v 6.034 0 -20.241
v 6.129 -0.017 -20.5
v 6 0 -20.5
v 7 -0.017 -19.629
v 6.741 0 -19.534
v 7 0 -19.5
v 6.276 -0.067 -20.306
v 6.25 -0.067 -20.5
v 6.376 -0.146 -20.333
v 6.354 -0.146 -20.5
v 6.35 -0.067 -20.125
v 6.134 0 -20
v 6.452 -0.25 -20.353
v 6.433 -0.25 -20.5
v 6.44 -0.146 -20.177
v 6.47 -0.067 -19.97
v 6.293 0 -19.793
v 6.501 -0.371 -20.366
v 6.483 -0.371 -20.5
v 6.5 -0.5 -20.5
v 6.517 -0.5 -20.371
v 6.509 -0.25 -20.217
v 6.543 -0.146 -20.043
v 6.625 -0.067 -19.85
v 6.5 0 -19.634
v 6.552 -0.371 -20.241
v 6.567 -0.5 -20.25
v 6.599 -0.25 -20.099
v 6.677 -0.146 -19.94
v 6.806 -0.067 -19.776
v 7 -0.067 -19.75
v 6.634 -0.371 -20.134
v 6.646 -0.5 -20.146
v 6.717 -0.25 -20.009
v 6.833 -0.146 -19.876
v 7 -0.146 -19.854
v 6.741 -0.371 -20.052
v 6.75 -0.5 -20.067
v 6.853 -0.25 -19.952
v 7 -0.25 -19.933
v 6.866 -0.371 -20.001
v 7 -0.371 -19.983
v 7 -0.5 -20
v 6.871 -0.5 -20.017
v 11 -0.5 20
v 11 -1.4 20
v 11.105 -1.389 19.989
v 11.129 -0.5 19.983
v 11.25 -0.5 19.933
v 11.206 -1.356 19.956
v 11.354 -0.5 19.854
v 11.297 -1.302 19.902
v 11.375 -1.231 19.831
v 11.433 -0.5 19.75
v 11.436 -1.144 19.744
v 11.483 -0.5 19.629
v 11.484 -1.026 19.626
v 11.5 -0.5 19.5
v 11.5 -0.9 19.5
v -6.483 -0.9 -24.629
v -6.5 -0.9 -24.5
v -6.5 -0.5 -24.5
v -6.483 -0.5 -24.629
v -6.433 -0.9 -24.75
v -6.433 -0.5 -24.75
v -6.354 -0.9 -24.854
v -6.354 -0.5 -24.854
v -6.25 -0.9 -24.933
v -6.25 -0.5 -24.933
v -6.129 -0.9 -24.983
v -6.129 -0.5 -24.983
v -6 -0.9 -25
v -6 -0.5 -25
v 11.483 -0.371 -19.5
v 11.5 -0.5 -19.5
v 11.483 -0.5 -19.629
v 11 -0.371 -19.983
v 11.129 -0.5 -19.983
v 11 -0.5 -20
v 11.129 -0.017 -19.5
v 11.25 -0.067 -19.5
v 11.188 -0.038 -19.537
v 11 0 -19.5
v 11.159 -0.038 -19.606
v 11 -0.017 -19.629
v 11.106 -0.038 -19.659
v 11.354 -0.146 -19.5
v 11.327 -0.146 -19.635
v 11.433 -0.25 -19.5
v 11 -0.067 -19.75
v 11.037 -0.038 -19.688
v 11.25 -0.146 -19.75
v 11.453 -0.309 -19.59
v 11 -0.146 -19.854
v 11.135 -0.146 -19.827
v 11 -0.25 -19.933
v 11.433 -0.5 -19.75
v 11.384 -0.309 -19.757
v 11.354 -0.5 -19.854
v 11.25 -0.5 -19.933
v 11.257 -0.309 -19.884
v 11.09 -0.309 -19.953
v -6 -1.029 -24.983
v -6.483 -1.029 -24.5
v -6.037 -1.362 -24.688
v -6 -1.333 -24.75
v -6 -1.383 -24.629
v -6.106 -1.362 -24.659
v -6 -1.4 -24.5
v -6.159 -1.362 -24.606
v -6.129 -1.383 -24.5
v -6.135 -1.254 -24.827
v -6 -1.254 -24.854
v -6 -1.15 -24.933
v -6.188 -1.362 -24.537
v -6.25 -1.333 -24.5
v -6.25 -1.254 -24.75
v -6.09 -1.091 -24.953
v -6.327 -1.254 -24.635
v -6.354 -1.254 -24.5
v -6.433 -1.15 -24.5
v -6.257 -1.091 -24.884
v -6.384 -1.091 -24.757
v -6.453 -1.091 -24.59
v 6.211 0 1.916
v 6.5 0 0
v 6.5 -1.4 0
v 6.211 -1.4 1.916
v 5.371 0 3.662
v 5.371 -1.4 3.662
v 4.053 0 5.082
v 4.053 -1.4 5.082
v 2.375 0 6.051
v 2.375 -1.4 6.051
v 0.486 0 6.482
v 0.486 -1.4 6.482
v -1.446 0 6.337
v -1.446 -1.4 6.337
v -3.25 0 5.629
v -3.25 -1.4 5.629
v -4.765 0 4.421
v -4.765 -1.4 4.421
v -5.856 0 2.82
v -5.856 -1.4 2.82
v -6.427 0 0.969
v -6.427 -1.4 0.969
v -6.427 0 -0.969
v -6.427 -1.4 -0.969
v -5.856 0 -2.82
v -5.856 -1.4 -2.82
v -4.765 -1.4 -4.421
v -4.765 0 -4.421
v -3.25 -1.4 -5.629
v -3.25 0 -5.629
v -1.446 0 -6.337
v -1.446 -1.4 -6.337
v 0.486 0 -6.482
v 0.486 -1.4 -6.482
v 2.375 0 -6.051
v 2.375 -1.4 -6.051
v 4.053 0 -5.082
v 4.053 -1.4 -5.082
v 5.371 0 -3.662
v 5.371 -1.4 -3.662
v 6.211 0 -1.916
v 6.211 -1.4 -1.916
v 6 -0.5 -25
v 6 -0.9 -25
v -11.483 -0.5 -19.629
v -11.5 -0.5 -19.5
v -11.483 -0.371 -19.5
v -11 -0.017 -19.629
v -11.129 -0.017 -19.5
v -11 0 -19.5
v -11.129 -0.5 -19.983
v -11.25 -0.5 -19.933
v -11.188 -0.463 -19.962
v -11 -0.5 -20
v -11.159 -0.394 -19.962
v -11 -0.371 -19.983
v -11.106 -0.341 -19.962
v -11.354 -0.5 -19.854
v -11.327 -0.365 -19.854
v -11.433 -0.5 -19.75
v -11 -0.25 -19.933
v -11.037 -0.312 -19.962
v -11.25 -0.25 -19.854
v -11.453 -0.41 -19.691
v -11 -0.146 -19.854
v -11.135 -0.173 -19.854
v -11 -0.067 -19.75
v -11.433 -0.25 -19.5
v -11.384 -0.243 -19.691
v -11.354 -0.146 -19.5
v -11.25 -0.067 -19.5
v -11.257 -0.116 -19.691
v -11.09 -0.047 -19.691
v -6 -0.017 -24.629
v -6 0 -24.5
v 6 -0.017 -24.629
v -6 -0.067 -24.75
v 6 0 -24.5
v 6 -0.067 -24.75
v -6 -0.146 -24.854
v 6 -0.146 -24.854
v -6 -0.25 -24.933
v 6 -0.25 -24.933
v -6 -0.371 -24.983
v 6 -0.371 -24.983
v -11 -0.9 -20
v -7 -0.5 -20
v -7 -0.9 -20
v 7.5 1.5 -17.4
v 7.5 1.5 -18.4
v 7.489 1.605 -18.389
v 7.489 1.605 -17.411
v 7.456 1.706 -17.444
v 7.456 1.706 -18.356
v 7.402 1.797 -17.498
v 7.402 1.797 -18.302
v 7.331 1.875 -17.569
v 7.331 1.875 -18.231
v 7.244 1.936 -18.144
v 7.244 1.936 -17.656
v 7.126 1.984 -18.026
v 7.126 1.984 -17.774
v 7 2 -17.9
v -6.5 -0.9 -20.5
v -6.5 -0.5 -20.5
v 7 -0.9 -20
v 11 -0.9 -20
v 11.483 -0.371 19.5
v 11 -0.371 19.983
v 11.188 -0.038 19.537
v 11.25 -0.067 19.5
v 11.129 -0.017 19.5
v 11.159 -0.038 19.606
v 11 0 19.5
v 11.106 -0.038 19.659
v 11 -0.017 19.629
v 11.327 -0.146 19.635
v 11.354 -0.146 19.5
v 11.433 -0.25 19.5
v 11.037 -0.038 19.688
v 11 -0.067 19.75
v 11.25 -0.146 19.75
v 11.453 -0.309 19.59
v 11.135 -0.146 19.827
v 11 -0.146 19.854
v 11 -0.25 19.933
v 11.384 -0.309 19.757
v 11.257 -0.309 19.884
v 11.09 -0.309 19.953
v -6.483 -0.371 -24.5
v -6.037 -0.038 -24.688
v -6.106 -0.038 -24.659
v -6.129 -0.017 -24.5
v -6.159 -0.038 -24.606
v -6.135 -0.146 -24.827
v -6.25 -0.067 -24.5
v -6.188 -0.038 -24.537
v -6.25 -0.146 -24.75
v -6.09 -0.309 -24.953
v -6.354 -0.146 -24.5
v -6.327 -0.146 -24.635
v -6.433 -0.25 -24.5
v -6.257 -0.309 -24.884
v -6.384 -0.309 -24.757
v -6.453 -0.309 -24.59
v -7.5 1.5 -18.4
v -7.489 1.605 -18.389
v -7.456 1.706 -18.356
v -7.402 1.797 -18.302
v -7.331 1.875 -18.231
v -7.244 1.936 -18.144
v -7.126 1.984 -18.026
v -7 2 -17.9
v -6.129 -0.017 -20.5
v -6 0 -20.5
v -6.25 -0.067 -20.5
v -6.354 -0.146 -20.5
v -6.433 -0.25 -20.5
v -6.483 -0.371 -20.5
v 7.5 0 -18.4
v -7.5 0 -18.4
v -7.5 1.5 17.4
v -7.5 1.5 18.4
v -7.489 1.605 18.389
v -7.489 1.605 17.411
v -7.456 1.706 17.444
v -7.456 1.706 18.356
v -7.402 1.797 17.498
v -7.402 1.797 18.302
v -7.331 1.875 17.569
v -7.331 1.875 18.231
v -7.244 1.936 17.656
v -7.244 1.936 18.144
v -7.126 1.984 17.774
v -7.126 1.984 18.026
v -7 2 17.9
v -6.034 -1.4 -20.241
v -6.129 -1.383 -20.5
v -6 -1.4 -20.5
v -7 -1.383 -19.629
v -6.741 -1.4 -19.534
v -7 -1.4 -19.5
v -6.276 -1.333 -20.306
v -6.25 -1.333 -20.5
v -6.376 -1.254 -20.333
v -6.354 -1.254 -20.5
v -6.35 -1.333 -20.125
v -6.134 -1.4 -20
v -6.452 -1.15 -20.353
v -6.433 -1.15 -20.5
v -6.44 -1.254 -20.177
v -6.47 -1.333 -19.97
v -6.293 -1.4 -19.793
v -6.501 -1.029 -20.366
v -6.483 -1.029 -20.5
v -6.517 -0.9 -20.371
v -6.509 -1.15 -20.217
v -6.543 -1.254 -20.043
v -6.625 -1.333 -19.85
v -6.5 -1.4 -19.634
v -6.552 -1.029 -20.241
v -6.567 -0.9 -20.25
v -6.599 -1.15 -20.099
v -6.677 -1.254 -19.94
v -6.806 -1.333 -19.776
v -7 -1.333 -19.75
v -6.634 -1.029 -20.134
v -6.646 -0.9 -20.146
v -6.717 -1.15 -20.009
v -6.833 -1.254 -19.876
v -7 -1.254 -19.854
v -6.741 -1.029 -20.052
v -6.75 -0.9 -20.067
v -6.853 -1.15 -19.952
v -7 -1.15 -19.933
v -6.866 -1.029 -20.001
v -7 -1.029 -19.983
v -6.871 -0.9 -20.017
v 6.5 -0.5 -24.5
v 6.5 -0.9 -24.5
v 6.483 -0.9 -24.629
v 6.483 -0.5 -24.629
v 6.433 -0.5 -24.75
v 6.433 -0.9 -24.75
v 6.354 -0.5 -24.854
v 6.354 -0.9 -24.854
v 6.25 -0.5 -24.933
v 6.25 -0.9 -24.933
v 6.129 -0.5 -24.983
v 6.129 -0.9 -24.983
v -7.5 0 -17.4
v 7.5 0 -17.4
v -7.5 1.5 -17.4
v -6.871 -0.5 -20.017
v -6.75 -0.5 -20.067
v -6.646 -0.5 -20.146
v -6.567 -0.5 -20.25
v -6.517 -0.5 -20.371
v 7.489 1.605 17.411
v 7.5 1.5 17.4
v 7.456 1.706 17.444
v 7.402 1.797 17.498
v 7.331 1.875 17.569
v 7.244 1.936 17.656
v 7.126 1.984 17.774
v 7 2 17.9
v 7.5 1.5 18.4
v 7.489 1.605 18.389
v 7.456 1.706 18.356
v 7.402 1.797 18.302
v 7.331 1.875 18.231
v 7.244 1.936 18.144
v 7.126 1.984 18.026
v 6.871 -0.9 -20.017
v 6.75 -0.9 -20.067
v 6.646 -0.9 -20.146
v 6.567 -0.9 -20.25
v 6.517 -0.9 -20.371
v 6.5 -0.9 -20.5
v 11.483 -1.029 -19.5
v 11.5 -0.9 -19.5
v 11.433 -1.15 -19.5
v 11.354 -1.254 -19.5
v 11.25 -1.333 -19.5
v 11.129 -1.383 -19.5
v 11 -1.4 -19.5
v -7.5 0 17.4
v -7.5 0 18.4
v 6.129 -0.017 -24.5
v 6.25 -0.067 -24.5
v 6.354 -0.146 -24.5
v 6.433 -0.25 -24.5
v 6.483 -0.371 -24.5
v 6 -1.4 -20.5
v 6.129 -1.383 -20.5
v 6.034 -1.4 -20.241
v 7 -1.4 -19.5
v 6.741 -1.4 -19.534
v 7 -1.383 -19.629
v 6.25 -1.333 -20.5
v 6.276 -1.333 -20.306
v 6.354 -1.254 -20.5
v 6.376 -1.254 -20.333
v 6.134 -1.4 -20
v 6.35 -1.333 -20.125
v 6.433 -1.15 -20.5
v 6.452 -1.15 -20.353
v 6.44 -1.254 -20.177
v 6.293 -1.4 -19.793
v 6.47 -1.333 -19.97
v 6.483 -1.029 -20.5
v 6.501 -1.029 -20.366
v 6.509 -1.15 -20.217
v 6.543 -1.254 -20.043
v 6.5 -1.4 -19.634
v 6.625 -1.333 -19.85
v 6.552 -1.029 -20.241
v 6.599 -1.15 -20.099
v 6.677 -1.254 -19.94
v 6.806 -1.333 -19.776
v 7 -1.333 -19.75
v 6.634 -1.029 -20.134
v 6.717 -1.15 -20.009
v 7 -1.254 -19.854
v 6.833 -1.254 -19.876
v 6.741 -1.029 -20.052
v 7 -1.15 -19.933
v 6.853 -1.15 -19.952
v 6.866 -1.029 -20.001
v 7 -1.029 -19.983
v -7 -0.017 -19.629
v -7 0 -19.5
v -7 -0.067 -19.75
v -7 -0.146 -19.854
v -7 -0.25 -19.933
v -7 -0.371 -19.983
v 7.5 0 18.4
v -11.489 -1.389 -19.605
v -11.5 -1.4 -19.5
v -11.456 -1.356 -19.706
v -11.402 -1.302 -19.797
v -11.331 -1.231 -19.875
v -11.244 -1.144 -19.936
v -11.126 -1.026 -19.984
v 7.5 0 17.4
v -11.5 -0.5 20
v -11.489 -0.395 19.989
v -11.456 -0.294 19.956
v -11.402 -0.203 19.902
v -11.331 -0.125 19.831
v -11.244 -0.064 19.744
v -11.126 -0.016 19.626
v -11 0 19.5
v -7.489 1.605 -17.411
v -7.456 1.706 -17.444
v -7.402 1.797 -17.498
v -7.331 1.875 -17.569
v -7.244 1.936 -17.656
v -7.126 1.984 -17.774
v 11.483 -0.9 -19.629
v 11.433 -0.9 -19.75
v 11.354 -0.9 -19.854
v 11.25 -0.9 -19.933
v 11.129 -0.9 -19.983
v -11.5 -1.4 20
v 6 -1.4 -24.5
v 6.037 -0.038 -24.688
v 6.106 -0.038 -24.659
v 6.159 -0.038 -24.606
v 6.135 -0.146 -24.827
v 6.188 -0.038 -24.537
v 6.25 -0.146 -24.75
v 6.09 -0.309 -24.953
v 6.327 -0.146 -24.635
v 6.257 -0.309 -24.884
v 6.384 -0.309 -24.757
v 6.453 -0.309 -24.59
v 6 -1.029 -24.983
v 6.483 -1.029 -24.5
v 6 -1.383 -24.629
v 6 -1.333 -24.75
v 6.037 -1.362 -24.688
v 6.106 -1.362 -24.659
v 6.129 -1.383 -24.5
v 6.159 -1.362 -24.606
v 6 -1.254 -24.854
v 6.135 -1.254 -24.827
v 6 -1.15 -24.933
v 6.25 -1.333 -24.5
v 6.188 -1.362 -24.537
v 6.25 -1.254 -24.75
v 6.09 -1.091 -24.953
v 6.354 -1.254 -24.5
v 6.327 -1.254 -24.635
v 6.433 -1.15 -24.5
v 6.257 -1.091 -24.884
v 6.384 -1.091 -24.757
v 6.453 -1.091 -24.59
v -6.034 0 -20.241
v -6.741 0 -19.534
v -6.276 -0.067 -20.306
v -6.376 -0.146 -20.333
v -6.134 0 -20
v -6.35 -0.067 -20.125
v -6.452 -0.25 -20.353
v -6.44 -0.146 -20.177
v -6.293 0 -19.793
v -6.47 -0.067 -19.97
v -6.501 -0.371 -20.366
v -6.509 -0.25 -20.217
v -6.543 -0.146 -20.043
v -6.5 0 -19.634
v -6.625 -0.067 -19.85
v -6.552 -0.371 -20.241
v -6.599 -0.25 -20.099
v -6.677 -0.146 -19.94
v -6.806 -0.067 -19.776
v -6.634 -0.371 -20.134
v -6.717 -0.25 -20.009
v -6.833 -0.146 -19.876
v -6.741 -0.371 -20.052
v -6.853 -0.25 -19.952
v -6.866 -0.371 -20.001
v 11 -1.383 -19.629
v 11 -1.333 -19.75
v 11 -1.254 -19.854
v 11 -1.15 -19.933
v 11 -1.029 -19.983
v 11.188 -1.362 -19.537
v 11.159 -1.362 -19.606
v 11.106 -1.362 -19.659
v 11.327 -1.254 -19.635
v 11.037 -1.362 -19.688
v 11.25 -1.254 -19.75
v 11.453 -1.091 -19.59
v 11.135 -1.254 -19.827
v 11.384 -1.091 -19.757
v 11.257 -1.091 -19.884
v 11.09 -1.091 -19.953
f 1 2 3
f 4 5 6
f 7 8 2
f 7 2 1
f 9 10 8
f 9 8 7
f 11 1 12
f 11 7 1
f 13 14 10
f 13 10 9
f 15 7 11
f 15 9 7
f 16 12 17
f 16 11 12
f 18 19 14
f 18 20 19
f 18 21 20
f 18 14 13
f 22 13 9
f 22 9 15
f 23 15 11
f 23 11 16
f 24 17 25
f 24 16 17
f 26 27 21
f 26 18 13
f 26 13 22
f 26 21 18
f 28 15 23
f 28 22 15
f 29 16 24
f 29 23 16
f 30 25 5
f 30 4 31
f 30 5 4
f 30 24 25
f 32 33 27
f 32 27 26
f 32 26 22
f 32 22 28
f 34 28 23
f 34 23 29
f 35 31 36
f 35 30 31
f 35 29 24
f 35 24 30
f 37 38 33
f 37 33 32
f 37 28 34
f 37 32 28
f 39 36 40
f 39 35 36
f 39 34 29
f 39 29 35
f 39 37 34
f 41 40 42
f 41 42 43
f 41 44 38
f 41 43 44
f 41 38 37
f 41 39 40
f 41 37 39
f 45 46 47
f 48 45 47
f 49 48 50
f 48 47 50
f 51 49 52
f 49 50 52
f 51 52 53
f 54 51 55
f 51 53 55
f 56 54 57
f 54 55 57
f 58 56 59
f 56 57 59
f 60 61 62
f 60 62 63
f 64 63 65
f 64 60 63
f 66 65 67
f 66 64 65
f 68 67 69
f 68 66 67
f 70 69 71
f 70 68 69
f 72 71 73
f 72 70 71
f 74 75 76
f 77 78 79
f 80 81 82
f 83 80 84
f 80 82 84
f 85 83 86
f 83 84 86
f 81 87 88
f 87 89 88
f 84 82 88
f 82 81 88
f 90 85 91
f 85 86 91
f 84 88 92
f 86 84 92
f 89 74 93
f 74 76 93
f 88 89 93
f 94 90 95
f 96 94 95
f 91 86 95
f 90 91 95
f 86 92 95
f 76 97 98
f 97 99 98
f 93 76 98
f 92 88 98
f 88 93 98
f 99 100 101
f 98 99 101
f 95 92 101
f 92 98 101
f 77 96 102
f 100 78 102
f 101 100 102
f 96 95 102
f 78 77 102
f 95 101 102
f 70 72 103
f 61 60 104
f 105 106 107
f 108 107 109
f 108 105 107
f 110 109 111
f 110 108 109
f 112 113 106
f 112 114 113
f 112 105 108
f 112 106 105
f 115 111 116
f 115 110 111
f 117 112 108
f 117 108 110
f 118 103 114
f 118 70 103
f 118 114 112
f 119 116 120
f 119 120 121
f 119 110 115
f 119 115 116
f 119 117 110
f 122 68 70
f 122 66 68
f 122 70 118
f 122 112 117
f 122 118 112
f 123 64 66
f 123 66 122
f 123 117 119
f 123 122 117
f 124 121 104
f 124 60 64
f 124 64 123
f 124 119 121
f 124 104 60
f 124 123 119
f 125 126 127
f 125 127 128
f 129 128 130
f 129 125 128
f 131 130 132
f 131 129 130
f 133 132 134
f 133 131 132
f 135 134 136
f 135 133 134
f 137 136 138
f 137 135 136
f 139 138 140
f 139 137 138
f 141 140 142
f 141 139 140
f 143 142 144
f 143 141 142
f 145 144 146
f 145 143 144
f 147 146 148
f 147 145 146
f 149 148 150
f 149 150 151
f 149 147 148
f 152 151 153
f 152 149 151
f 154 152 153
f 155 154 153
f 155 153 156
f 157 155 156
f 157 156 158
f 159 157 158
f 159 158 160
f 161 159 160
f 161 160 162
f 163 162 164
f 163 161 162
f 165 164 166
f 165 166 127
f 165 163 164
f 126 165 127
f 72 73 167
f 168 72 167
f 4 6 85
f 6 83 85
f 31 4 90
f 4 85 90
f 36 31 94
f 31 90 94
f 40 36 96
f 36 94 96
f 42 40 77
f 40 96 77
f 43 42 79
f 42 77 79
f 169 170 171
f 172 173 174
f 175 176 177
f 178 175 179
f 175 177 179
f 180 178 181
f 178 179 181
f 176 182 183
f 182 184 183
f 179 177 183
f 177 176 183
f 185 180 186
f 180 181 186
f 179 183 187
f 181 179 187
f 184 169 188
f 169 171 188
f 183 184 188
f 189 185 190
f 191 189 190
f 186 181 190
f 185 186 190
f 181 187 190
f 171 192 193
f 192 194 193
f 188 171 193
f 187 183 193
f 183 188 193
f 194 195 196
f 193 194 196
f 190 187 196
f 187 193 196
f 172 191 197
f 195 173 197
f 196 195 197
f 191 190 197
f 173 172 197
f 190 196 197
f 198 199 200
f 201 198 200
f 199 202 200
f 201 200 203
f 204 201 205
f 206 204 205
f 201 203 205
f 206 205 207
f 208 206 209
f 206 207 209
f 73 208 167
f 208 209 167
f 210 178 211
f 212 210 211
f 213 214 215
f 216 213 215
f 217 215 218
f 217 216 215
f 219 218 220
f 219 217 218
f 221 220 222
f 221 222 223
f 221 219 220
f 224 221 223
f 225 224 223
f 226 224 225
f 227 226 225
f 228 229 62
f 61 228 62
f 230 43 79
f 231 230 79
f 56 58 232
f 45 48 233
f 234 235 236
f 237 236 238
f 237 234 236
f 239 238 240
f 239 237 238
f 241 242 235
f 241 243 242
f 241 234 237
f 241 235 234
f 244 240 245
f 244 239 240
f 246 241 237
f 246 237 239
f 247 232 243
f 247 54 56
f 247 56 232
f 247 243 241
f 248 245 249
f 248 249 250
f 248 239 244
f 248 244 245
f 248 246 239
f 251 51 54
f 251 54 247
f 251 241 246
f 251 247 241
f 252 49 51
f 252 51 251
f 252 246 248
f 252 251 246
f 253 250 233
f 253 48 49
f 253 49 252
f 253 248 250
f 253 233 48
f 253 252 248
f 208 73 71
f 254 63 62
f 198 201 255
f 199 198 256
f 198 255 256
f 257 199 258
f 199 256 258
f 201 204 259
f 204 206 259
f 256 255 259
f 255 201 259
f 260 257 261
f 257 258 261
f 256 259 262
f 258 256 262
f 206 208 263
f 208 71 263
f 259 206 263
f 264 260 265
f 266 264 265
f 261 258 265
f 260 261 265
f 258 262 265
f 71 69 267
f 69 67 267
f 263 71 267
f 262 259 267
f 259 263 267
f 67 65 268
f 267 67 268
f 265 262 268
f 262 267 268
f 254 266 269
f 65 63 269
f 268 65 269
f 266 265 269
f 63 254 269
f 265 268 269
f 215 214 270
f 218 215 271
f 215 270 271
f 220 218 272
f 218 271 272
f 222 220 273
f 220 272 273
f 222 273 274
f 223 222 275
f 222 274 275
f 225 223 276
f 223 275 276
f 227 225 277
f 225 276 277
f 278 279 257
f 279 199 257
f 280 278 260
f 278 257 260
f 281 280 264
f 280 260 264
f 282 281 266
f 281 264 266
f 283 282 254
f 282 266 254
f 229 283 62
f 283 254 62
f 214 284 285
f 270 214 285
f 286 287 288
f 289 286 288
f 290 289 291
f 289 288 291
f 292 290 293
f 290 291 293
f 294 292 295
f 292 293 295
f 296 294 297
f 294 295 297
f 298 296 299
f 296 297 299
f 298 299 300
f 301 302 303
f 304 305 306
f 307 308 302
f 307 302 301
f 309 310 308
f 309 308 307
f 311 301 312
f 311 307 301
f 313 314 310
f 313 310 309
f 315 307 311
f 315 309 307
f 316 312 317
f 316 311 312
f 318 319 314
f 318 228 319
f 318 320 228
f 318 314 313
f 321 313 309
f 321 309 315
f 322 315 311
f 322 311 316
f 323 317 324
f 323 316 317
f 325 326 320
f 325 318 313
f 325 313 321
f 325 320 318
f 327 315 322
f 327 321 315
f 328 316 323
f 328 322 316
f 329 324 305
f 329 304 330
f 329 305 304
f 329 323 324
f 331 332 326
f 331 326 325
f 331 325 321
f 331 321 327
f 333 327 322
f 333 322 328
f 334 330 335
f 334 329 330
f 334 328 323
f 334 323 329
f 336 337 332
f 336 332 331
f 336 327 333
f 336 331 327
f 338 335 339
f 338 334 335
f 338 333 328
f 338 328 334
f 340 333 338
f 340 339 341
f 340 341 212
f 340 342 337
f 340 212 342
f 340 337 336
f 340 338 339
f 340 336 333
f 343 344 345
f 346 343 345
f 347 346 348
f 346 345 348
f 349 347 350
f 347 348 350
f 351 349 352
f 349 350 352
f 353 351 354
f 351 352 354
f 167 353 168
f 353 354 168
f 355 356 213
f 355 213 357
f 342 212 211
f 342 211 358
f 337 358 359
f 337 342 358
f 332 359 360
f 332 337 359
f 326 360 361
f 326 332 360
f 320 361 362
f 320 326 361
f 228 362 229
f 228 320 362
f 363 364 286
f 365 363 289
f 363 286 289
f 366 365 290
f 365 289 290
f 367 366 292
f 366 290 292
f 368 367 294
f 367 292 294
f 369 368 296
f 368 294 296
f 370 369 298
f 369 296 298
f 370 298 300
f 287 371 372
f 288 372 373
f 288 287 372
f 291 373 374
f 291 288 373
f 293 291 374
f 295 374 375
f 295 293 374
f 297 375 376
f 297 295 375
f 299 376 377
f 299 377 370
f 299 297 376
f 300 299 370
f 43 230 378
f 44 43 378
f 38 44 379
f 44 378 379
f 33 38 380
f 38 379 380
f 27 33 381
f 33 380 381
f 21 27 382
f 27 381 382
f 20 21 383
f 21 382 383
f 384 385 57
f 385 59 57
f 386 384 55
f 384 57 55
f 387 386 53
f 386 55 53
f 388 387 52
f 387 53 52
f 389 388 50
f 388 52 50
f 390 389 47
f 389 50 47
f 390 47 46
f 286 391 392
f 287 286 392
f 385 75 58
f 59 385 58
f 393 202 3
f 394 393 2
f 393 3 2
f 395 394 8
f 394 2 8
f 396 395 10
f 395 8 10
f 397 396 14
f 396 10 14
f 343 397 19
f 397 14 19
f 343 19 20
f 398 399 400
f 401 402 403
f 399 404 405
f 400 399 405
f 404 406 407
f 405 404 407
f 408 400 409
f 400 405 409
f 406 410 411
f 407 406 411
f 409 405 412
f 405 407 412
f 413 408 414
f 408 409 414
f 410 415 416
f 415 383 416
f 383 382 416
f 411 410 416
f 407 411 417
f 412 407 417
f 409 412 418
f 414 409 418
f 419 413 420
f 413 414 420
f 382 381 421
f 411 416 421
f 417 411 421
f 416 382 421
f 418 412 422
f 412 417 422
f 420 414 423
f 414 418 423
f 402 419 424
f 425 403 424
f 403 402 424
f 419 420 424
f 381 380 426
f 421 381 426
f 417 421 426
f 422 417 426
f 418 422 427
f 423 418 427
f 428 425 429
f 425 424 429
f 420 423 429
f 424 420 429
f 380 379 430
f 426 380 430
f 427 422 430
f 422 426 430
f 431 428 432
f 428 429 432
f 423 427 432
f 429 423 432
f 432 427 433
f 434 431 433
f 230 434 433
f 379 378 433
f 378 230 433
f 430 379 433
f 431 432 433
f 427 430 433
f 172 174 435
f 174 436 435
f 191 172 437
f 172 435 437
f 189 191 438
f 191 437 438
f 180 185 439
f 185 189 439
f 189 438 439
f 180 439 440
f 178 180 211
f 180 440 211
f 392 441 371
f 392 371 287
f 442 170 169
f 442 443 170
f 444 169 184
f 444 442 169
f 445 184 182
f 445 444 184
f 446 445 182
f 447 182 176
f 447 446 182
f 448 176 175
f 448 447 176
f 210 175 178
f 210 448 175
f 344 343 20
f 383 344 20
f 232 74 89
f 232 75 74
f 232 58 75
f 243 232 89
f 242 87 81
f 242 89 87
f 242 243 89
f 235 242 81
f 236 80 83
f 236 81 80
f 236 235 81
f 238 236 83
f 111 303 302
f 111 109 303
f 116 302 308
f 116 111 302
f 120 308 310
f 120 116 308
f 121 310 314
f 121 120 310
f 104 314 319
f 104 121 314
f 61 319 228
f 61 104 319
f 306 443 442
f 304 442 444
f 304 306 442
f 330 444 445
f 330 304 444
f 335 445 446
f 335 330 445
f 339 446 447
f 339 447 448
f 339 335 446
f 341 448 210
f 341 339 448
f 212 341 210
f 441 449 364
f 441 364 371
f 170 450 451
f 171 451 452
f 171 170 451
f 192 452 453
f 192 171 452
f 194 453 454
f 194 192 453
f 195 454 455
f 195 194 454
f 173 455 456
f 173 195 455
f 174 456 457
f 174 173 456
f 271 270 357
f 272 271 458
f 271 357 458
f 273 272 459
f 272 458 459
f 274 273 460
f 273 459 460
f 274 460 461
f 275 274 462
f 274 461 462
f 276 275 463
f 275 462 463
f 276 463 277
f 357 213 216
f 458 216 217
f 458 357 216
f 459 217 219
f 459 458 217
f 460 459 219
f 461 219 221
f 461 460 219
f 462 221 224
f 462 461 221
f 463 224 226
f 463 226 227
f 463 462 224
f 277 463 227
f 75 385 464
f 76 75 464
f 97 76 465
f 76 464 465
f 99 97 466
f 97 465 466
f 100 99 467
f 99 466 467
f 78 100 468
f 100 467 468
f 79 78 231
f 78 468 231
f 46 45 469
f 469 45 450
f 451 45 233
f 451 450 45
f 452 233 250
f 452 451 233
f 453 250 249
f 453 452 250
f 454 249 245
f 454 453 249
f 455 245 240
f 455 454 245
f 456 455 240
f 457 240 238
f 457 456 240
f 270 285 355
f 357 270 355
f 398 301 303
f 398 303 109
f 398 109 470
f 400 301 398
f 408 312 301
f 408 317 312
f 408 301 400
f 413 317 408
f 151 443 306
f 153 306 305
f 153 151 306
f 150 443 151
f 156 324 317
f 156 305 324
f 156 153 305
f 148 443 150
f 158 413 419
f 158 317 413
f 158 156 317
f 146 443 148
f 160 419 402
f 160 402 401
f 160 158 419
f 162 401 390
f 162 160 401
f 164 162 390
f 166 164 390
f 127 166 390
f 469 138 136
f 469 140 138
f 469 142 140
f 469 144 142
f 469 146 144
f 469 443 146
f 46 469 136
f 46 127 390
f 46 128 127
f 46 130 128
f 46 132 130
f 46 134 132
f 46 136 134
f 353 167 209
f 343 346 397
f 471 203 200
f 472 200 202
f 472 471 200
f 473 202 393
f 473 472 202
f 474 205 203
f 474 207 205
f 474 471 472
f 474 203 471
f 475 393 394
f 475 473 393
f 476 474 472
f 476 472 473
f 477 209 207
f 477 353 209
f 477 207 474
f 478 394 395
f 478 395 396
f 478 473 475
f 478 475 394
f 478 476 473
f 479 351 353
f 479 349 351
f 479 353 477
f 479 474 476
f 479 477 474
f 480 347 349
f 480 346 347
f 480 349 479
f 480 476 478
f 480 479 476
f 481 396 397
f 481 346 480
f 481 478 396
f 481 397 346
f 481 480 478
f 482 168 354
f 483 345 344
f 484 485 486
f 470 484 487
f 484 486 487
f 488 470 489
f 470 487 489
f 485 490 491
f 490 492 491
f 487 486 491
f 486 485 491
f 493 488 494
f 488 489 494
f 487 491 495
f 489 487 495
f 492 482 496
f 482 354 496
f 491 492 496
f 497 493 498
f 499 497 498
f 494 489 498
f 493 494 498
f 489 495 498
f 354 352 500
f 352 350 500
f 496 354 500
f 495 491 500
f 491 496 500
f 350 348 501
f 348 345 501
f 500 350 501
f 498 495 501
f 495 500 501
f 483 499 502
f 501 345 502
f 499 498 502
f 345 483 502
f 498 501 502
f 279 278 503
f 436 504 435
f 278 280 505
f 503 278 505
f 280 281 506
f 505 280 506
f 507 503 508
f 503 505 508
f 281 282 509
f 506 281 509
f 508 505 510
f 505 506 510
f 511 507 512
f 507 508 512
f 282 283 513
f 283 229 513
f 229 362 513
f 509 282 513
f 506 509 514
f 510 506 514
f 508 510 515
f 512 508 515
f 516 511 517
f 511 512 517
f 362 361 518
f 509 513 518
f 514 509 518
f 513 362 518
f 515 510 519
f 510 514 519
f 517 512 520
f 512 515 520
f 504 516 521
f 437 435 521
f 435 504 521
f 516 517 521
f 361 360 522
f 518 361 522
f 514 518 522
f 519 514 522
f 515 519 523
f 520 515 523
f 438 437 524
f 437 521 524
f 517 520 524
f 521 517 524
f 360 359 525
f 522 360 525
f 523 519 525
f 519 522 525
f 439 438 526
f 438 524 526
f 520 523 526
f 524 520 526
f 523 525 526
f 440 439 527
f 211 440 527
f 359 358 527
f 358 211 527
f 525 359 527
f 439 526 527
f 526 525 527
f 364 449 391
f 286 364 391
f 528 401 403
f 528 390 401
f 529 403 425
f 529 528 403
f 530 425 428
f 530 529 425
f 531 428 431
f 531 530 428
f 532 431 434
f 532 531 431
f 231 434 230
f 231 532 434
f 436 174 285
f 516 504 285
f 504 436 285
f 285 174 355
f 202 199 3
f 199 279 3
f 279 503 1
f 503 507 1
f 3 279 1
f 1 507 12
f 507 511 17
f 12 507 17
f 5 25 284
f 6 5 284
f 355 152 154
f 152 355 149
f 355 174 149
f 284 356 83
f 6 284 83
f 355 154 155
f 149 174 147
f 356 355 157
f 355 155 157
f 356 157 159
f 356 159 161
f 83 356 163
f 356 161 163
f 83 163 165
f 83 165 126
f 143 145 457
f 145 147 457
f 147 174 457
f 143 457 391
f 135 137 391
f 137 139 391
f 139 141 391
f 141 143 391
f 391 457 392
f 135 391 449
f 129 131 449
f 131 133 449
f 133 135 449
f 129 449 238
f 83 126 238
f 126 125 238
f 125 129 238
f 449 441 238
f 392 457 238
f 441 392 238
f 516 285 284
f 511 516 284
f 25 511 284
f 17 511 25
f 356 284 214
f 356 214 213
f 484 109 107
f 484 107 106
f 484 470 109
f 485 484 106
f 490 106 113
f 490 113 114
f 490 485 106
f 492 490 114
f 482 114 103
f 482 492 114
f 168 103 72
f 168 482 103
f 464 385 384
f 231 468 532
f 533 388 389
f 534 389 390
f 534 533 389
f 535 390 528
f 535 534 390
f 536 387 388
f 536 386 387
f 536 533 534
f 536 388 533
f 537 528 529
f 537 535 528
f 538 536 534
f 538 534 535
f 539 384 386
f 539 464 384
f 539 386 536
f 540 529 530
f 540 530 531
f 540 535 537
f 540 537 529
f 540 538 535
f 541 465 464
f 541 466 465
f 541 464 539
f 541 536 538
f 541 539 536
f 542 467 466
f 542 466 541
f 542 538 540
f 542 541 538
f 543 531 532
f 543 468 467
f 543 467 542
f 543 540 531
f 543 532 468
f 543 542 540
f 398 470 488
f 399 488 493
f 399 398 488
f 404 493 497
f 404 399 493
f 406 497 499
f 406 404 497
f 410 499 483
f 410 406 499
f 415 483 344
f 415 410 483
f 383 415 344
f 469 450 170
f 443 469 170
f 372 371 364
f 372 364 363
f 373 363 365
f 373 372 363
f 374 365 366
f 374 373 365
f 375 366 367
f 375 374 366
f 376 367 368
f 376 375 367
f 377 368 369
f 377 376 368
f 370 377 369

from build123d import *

# Parameters (mm, degrees)
F0_R     = 6.5
F1_DEPTH = 1.4
F2_W     = 15
F2_H     = 1
F3_DEPTH = 2
F4_R     = 0.49999


# Not quite as in the source:
# - a fillet or chamfer is up to 0.001 mm smaller than in the source, because OpenCascade refuses the exact size


with BuildPart() as f1:
    # F0 (on Front) → F1 (new body)
    with BuildSketch(Plane.XZ):
        Polygon((11.5, 20), (-11.5, 20), (-11.5, -20), (-6.5, -20), (-6.5, -25), (6.5, -25), (6.5, -20), (11.5, -20), align=None)
        Circle(F0_R, mode=Mode.SUBTRACT)
    extrude(amount=F1_DEPTH)

    # F2 (on face) → F3 (join)
    with BuildSketch(Plane(origin=(0, 0, 0), x_dir=(-1, 0, 0), z_dir=(0, 1, 0))):
        with Locations((0, 17.9)):
            Rectangle(F2_W, F2_H)
        with Locations((0, -17.9)):
            Rectangle(F2_W, F2_H)
    extrude(amount=F3_DEPTH)

    # F4 (radius 0.5 in the source; OpenCascade refuses exactly that, so slightly less here)
    f4_edges = [f1.edges().sort_by_distance(p)[0] for p in [
        (-6.5, -0.7, -25),
        (6.5, -0.7, -25),
        (0, 0, -25),
        (0, -1.4, -25),
        (6.5, -0.7, -20),
        (6.5, 0, -22.5),
        (6.5, -1.4, -22.5),
        (11.5, -0.7, -20),
        (11.5, -0.7, 20),
        (11.5, 0, 0),
        (11.5, -1.4, 0),
        (-11.5, 0, 0),
        (-6.5, -0.7, -20),
        (-6.5, 0, -22.5),
        (-6.5, -1.4, -22.5),
        (-11.5, -0.7, -20),
        (-9, 0, -20),
        (-9, -1.4, -20),
        (0, 0, 20),
        (0, 2, 17.4),
        (-7.5, 2, 17.9),
        (0, 2, 18.4),
        (7.5, 2, 17.9),
        (-7.5, 2, -17.9),
        (0, 2, -17.4),
        (7.5, 2, -17.9),
        (0, 2, -18.4),
        (9, 0, -20),
        (9, -1.4, -20),
    ]]
    fillet(f4_edges, radius=F4_R)


solid = f1.part
